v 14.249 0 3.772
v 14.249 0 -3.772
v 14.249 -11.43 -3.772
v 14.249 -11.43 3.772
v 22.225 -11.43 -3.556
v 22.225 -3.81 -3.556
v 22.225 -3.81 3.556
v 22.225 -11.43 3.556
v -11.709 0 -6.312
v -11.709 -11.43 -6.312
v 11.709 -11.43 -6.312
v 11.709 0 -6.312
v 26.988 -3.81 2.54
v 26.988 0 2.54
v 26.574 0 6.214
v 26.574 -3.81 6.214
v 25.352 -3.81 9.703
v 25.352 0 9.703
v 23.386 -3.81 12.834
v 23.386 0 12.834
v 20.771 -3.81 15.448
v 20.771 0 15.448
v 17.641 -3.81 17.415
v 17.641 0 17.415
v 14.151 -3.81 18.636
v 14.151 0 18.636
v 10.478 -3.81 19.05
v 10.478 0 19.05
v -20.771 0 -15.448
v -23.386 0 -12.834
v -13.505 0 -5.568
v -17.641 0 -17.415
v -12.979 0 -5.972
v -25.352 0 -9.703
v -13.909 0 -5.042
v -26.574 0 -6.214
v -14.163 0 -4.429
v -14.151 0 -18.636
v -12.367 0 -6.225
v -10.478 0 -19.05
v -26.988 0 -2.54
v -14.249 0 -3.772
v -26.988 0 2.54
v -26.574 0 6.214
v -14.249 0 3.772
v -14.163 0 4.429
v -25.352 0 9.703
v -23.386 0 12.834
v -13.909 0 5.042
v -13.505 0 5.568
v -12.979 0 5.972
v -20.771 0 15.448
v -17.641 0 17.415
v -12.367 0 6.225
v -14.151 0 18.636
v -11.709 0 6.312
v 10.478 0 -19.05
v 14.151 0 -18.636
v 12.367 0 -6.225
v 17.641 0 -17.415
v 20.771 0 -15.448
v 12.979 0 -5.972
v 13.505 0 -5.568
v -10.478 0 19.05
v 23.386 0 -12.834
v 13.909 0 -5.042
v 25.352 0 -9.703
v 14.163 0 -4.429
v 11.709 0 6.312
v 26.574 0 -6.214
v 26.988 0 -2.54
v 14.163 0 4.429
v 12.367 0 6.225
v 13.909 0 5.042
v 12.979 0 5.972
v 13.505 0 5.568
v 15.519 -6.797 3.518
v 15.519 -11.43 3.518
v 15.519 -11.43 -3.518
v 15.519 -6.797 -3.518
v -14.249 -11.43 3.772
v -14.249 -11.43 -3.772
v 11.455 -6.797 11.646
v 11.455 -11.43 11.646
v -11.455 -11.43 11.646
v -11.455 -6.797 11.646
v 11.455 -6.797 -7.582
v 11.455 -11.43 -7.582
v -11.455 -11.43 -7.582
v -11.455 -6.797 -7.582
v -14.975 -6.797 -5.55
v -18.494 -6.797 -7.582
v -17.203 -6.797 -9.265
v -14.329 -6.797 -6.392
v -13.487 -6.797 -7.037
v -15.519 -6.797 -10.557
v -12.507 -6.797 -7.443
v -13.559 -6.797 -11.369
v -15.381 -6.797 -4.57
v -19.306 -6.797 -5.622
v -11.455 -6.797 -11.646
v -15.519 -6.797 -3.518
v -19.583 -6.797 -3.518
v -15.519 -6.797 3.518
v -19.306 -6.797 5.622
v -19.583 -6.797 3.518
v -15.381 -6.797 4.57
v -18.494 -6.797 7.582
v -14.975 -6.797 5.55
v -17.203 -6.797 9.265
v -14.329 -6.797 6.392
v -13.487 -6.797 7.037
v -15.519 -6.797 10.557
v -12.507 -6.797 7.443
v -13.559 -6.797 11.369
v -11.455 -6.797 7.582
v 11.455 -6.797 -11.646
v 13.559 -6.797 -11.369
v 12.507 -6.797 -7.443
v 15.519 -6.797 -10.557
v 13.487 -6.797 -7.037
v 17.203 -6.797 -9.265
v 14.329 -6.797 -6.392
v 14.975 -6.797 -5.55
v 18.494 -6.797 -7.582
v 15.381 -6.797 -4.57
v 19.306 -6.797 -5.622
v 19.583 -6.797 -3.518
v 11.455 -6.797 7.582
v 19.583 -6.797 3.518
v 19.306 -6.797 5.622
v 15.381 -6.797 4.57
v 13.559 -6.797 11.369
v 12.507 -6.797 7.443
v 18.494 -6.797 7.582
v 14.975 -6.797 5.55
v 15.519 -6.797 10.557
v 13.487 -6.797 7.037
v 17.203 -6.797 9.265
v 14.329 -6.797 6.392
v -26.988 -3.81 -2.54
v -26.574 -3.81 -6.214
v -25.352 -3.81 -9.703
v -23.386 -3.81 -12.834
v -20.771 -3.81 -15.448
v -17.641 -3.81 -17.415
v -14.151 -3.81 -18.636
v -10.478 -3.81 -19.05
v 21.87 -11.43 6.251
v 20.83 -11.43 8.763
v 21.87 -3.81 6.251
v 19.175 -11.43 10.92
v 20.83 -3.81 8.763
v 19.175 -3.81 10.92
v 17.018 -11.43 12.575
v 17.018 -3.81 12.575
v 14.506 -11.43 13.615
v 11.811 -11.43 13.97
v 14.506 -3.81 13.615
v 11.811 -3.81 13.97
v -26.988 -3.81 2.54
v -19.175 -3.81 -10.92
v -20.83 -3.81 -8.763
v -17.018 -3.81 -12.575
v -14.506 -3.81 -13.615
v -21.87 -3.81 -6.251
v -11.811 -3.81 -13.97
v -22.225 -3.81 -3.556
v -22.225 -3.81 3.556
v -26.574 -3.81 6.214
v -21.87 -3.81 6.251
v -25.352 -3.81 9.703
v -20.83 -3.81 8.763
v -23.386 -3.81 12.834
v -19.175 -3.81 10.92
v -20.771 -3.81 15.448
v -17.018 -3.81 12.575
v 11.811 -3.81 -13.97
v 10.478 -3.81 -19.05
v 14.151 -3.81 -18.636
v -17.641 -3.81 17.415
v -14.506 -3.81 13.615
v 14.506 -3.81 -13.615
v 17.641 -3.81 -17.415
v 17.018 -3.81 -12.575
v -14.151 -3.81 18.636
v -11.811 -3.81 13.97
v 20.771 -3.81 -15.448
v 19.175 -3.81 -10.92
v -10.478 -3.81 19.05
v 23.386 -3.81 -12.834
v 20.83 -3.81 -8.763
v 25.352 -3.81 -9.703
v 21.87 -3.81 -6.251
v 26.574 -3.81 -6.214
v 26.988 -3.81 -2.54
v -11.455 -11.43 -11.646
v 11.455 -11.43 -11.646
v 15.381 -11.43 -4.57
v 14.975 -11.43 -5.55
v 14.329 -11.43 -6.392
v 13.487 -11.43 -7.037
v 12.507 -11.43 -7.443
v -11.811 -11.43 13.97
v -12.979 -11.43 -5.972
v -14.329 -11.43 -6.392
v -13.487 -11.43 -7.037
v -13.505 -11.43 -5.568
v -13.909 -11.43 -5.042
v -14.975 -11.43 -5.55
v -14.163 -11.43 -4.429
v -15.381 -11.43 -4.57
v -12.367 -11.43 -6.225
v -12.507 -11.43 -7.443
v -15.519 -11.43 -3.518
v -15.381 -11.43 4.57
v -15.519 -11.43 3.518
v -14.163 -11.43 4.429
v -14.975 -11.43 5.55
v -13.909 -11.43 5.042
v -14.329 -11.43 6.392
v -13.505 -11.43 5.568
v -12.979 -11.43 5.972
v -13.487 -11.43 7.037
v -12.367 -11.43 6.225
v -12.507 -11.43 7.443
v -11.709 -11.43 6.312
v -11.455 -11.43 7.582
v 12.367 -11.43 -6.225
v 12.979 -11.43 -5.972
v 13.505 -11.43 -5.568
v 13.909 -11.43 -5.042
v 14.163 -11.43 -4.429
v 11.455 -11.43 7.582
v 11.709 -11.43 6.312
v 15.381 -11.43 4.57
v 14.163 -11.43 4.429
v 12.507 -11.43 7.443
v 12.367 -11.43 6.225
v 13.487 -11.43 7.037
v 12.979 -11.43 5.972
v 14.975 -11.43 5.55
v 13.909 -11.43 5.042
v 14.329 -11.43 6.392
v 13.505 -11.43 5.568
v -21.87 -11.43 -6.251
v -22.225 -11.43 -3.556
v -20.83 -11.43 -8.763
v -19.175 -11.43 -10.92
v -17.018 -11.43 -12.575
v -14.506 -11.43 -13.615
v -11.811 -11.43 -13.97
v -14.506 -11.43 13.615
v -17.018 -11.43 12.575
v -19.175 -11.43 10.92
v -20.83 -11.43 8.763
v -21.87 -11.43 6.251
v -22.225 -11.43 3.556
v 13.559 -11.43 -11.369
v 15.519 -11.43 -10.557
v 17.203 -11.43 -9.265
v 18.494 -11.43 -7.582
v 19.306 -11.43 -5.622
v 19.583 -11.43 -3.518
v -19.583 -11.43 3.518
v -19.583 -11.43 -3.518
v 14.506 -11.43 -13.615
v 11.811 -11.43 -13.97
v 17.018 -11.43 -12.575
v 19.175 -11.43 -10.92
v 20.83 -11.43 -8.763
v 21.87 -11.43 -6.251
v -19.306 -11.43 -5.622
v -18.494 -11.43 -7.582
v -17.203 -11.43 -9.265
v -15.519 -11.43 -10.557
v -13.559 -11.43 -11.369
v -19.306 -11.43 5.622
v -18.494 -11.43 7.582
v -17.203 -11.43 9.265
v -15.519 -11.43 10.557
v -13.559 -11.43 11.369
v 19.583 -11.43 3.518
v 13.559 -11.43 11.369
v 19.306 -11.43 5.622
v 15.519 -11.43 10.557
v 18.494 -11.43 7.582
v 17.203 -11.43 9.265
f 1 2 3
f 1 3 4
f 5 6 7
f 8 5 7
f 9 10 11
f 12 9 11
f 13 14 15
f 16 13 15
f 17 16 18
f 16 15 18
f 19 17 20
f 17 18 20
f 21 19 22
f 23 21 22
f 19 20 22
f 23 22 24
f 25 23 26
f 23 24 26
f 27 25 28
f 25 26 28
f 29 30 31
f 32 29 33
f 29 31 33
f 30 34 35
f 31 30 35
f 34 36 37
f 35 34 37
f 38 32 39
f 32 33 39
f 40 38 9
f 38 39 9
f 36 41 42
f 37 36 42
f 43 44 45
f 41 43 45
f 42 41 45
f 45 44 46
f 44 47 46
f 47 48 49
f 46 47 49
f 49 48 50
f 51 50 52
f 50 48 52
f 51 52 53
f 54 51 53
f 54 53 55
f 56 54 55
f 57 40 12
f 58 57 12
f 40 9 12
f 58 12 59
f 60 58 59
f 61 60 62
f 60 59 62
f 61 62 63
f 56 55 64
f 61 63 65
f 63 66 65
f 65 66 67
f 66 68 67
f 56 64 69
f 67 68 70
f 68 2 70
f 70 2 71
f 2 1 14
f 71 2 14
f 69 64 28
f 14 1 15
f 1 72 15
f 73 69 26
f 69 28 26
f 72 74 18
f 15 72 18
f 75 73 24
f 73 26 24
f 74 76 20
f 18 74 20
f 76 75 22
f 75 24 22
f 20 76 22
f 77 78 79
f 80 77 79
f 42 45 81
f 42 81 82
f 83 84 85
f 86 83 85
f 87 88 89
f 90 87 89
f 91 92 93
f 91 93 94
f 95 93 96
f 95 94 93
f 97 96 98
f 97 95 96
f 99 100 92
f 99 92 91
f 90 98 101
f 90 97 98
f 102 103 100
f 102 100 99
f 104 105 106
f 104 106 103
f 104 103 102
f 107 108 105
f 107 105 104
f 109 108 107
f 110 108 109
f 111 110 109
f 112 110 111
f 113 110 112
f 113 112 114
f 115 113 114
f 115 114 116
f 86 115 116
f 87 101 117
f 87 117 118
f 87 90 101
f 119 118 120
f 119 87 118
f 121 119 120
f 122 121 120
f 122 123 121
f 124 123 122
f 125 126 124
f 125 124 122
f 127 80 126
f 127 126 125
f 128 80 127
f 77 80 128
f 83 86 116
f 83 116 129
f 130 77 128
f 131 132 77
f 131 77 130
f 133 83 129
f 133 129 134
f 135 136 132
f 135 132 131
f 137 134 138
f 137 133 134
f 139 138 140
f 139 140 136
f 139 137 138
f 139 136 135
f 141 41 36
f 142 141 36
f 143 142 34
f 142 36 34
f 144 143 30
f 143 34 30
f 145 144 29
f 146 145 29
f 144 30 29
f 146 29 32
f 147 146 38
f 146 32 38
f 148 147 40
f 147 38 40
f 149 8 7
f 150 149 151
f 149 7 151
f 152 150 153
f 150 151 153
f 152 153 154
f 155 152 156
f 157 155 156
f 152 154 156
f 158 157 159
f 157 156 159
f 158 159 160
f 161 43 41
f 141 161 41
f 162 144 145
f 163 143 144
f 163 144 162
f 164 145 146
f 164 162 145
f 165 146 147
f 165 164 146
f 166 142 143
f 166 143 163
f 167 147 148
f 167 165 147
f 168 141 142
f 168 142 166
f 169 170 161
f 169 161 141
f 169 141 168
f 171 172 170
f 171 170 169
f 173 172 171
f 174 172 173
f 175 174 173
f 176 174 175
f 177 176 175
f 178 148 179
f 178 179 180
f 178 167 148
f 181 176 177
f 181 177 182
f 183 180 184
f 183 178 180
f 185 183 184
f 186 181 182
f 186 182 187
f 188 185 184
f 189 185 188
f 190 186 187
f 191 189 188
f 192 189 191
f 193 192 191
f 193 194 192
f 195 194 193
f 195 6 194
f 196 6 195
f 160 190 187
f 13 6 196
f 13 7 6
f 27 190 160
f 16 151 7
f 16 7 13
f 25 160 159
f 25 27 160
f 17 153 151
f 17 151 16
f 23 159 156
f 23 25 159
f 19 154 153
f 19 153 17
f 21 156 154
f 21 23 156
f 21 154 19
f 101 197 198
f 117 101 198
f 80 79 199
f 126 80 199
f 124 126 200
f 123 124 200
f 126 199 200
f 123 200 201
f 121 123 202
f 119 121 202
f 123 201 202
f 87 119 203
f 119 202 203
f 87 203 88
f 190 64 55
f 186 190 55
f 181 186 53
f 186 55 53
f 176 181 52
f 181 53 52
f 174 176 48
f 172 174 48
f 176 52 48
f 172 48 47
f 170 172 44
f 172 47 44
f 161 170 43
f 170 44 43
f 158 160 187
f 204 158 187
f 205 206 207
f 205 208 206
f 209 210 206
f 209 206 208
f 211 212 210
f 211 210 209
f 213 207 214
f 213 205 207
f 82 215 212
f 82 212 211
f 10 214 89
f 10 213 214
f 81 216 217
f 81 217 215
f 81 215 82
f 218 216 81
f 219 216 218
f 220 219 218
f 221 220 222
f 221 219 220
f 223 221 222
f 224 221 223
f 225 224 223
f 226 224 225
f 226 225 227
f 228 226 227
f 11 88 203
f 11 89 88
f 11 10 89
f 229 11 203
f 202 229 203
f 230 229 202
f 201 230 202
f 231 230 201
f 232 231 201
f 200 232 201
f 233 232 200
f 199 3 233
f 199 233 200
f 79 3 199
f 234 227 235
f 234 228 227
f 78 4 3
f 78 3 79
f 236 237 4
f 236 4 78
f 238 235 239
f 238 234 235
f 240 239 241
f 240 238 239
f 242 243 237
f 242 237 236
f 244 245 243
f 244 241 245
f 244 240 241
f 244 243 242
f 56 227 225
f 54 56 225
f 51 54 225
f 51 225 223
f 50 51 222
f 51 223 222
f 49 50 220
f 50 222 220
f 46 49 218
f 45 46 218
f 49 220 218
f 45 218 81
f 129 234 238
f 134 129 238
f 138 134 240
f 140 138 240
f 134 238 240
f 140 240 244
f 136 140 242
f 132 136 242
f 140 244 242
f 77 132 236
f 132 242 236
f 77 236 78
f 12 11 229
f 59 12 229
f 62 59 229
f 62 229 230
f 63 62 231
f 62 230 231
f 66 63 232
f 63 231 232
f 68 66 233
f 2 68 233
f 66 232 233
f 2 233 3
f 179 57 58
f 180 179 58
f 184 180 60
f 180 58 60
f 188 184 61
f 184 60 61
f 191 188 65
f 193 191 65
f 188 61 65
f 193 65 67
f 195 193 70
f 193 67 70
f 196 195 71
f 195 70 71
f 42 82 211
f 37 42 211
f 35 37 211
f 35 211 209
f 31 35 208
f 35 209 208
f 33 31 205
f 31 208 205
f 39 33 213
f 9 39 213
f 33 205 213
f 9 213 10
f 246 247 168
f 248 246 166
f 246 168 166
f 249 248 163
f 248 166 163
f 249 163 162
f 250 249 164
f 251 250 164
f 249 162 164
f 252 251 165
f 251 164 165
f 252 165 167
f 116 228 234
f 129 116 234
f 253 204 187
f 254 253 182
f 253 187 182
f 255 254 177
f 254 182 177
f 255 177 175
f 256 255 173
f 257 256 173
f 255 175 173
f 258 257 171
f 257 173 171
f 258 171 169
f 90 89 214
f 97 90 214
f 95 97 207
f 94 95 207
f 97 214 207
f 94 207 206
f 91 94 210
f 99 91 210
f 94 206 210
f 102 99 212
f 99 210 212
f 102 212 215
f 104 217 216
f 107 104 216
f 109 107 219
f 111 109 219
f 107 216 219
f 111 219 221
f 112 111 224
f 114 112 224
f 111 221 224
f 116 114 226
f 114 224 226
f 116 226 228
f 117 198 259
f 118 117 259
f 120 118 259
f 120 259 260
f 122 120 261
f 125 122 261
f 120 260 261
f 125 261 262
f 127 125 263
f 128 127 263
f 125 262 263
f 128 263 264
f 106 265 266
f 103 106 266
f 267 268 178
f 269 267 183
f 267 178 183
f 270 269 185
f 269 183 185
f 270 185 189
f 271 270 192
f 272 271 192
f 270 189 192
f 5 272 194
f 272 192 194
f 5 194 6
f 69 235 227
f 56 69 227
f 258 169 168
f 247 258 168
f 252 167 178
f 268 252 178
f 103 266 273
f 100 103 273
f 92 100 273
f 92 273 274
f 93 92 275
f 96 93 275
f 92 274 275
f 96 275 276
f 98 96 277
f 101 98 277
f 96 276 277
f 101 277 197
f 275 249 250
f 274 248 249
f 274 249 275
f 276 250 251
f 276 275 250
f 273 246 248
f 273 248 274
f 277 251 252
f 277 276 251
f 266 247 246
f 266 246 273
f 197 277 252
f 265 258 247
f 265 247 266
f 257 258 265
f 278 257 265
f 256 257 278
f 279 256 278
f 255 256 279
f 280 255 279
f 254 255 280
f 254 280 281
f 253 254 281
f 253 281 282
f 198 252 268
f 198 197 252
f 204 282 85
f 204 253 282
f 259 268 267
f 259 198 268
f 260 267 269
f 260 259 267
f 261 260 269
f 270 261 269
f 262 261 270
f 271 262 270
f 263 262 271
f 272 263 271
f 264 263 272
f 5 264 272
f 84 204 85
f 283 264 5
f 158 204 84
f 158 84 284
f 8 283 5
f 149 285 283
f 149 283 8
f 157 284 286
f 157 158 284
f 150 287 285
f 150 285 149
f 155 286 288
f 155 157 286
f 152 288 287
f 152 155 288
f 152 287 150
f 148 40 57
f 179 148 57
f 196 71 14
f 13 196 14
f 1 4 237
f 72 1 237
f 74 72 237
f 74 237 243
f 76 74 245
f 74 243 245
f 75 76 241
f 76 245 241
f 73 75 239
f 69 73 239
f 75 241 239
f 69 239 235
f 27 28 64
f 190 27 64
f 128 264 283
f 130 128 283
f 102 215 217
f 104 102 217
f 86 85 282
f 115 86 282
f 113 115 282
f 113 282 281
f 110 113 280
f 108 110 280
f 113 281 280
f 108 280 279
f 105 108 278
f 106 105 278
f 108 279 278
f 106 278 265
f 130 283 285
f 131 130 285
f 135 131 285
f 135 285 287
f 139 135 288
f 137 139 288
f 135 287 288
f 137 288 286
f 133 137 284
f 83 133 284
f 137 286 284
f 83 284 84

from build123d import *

# Parameters (mm, degrees)
F1_DEPTH = 3.81
F3_DEPTH = 7.62
F5_DEPTH = 11.431
F7_DEPTH = 4.63296


with BuildPart() as f1:
    # F0 (on Front) → F1 (new body)
    with BuildSketch(Plane.XZ):
        with BuildLine():
            ThreePointArc((-26.9875, -2.54), (-22.1518329574, -14.2143329574), (-10.4775, -19.05))
            Line((-10.4775, -19.05), (10.4775, -19.05))
            ThreePointArc((10.4775, -19.05), (22.1518329574, -14.2143329574), (26.9875, -2.54))
            Line((26.9875, -2.54), (26.9875, 2.54))
            ThreePointArc((26.9875, 2.54), (22.1518329574, 14.2143329574), (10.4775, 19.05))
            Line((10.4775, 19.05), (-10.4775, 19.05))
            ThreePointArc((-10.4775, 19.05), (-22.1518329574, 14.2143329574), (-26.9875, 2.54))
            Line((-26.9875, 2.54), (-26.9875, -2.54))
        make_face()
    extrude(amount=F1_DEPTH)

    # F2 (on face) → F3 (join)
    with BuildSketch(Plane.XZ.offset(3.81)):
        with BuildLine():
            ThreePointArc((-22.225, -3.556), (-19.1748100193, -10.9198100193), (-11.811, -13.97))
            Line((-11.811, -13.97), (11.811, -13.97))
            ThreePointArc((11.811, -13.97), (19.1748100193, -10.9198100193), (22.225, -3.556))
            Line((22.225, -3.556), (22.225, 3.556))
            ThreePointArc((22.225, 3.556), (19.1748100193, 10.9198100193), (11.811, 13.97))
            Line((11.811, 13.97), (-11.811, 13.97))
            ThreePointArc((-11.811, 13.97), (-19.1748100193, 10.9198100193), (-22.225, 3.556))
            Line((-22.225, 3.556), (-22.225, -3.556))
        make_face()
    extrude(amount=F3_DEPTH)

    # F4 (on face) → F5 (cut, through all)
    with BuildSketch(Plane.XZ.offset(11.43)):
        with BuildLine():
            ThreePointArc((-14.2494, -3.7719), (-13.5054512242, -5.5679512242), (-11.7094, -6.3119))
            Line((-11.7094, -6.3119), (11.7094, -6.3119))
            ThreePointArc((11.7094, -6.3119), (13.5054512242, -5.5679512242), (14.2494, -3.7719))
            Line((14.2494, -3.7719), (14.2494, 3.7719))
            ThreePointArc((14.2494, 3.7719), (13.5054512242, 5.5679512242), (11.7094, 6.3119))
            Line((11.7094, 6.3119), (-11.7094, 6.3119))
            ThreePointArc((-11.7094, 6.3119), (-13.5054512242, 5.5679512242), (-14.2494, 3.7719))
            Line((-14.2494, 3.7719), (-14.2494, -3.7719))
        make_face()
    extrude(amount=-F5_DEPTH, mode=Mode.SUBTRACT)

    # F6 (on face) → F7 (cut)
    with BuildSketch(Plane.XZ.offset(11.43)):
        with BuildLine():
            Line((11.4554, 11.6459), (-11.4554, 11.6459))
            ThreePointArc((-11.4554, 11.6459), (-17.2027639175, 9.2652639175), (-19.5834, 3.5179))
            Line((-19.5834, 3.5179), (-19.5834, -3.5179))
            ThreePointArc((-19.5834, -3.5179), (-17.2027639175, -9.2652639175), (-11.4554, -11.6459))
            Line((-11.4554, -11.6459), (11.4554, -11.6459))
            ThreePointArc((11.4554, -11.6459), (17.2027639175, -9.2652639175), (19.5834, -3.5179))
            Line((19.5834, -3.5179), (19.5834, 3.5179))
            ThreePointArc((19.5834, 3.5179), (17.2027639175, 9.2652639175), (11.4554, 11.6459))
        make_face()
        with BuildLine():
            Line((11.4554, -7.5819), (-11.4554, -7.5819))
            ThreePointArc((-11.4554, -7.5819), (-14.3290819587, -6.3915819587), (-15.5194, -3.5179))
            Line((-15.5194, -3.5179), (-15.5194, 3.5179))
            ThreePointArc((-15.5194, 3.5179), (-14.3290819587, 6.3915819587), (-11.4554, 7.5819))
            Line((-11.4554, 7.5819), (11.4554, 7.5819))
            ThreePointArc((11.4554, 7.5819), (14.3290819587, 6.3915819587), (15.5194, 3.5179))
            Line((15.5194, 3.5179), (15.5194, -3.5179))
            ThreePointArc((15.5194, -3.5179), (14.3290819587, -6.3915819587), (11.4554, -7.5819))
        make_face(mode=Mode.SUBTRACT)
    extrude(amount=-F7_DEPTH, mode=Mode.SUBTRACT)


solid = f1.part
